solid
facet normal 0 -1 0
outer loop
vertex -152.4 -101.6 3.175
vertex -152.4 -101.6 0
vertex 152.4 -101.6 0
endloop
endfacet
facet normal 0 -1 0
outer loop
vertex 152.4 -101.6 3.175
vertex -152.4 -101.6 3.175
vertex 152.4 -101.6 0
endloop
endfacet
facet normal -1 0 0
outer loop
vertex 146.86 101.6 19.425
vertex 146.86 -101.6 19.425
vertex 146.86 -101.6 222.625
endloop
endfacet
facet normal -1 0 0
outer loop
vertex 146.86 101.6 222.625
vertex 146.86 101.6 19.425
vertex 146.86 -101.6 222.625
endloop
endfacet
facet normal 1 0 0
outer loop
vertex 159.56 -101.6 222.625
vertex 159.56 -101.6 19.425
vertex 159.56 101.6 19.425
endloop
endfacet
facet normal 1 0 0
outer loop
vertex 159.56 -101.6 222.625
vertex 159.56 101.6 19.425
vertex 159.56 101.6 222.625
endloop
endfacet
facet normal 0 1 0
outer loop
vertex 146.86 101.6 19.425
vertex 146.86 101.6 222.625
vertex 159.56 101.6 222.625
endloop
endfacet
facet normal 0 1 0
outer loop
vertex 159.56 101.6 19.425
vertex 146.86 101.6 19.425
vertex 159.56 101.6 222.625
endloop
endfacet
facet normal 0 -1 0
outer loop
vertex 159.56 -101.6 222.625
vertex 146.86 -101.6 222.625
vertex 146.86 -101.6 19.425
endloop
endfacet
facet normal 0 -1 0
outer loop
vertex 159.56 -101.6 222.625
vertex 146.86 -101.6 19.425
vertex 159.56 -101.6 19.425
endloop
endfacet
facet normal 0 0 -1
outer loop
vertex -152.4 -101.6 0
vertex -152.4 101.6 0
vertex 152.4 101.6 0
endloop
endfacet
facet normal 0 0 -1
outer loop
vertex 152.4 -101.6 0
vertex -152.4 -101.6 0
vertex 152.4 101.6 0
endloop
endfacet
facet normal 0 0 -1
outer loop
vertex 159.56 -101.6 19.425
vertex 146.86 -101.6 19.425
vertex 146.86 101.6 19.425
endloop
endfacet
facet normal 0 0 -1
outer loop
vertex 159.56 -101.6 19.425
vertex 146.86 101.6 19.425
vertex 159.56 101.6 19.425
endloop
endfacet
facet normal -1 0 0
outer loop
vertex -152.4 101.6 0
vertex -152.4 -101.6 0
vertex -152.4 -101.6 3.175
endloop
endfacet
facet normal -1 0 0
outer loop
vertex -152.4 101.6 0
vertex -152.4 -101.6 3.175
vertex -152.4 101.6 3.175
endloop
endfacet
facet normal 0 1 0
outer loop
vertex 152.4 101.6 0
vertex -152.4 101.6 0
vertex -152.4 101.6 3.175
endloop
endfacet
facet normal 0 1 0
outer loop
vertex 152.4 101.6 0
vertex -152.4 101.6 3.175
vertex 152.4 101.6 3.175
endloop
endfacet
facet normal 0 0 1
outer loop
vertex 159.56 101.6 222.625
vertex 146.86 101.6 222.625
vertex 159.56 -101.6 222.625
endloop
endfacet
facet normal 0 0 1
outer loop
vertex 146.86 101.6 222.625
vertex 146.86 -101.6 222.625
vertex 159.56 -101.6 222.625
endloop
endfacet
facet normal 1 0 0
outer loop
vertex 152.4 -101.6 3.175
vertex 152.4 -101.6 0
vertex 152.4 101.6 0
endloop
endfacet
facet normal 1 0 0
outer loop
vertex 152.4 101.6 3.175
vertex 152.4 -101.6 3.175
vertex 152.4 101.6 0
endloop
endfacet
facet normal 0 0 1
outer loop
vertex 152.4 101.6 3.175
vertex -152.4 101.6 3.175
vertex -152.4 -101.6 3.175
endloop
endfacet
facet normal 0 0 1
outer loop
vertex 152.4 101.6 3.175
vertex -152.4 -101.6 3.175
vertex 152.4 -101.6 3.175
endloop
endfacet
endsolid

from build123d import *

# Parameters (mm, degrees)
F0_W     = 304.8
F0_H     = 203.2
F1_DEPTH = 3.175
F2_W     = 12.7
F2_H     = 203.2
F3_DEPTH = 101.6


# Not quite as in the source:
# - a feature names something its author has since deleted; it is built from what else it names


with BuildPart() as f1:
    # F0 (on Top) → F1 (new body)
    with BuildSketch(Plane.XY):
        Rectangle(F0_W, F0_H)
    extrude(amount=F1_DEPTH)


with BuildPart() as f3:
    # F2 (on Front) → F3 (new body, symmetric)
    with BuildSketch(Plane.XZ):
        with Locations((153.2097309828, 121.0248197005)):
            Rectangle(F2_W, F2_H)
    extrude(amount=F3_DEPTH, both=True)


solid = Compound([f1.part, f3.part])
